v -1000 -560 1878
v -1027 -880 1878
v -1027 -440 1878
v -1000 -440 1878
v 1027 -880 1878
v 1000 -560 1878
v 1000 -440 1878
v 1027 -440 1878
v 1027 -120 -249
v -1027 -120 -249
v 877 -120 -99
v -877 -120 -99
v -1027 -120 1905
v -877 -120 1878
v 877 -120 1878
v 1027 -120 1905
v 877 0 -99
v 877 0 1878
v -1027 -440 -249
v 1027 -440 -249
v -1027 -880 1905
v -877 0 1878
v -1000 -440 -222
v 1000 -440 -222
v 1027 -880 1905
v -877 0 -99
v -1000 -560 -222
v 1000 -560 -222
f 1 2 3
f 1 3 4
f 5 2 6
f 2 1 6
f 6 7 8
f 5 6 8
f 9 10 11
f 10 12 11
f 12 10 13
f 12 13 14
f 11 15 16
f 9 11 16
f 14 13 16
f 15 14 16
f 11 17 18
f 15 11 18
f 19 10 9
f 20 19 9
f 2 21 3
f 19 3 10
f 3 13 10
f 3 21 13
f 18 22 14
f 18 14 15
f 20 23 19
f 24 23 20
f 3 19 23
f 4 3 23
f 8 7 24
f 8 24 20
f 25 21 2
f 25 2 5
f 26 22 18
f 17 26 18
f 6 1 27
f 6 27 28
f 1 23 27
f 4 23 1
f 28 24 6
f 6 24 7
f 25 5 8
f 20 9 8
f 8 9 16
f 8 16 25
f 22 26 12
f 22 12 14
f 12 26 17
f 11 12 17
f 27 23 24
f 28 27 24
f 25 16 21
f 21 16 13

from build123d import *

# Parameters (mm, degrees)
F1_W     = 1754
F1_H     = 1977
F2_DEPTH = 120
F3_W     = 2054
F3_H     = 2154
F3_W_2   = 1754
F3_H_2   = 1977
F4_DEPTH = 320
F5_W     = 2000
F5_H     = 2100
F6_DEPTH = 120
F8_DEPTH = 440


with BuildPart() as f2:
    # F1 (on face) → F2 (new body)
    with BuildSketch(Plane.XZ):
        with Locations((0, 889.5)):
            Rectangle(F1_W, F1_H)
    extrude(amount=F2_DEPTH)

    # F3 (on face) → F4 (join)
    with BuildSketch(Plane.XZ.offset(120)):
        with Locations((0, 828)):
            Rectangle(F3_W, F3_H)
        with Locations((0, 889.5)):
            Rectangle(F3_W_2, F3_H_2, mode=Mode.SUBTRACT)
        with Locations((0, 889.5)):
            Rectangle(F3_W_2, F3_H_2)
    extrude(amount=F4_DEPTH)

    # F5 (on face) → F6 (join)
    with BuildSketch(Plane.XZ.offset(440)):
        with Locations((0, 828)):
            Rectangle(F5_W, F5_H)
    extrude(amount=F6_DEPTH)

    # F7 (on face) → F8 (join)
    with BuildSketch(Plane.XZ.offset(440)):
        Polygon((1027, 1905), (-1027, 1905), (-1027, 1878), (-1000, 1878), (1000, 1878), (1027, 1878), align=None)
    extrude(amount=F8_DEPTH)


solid = f2.part
